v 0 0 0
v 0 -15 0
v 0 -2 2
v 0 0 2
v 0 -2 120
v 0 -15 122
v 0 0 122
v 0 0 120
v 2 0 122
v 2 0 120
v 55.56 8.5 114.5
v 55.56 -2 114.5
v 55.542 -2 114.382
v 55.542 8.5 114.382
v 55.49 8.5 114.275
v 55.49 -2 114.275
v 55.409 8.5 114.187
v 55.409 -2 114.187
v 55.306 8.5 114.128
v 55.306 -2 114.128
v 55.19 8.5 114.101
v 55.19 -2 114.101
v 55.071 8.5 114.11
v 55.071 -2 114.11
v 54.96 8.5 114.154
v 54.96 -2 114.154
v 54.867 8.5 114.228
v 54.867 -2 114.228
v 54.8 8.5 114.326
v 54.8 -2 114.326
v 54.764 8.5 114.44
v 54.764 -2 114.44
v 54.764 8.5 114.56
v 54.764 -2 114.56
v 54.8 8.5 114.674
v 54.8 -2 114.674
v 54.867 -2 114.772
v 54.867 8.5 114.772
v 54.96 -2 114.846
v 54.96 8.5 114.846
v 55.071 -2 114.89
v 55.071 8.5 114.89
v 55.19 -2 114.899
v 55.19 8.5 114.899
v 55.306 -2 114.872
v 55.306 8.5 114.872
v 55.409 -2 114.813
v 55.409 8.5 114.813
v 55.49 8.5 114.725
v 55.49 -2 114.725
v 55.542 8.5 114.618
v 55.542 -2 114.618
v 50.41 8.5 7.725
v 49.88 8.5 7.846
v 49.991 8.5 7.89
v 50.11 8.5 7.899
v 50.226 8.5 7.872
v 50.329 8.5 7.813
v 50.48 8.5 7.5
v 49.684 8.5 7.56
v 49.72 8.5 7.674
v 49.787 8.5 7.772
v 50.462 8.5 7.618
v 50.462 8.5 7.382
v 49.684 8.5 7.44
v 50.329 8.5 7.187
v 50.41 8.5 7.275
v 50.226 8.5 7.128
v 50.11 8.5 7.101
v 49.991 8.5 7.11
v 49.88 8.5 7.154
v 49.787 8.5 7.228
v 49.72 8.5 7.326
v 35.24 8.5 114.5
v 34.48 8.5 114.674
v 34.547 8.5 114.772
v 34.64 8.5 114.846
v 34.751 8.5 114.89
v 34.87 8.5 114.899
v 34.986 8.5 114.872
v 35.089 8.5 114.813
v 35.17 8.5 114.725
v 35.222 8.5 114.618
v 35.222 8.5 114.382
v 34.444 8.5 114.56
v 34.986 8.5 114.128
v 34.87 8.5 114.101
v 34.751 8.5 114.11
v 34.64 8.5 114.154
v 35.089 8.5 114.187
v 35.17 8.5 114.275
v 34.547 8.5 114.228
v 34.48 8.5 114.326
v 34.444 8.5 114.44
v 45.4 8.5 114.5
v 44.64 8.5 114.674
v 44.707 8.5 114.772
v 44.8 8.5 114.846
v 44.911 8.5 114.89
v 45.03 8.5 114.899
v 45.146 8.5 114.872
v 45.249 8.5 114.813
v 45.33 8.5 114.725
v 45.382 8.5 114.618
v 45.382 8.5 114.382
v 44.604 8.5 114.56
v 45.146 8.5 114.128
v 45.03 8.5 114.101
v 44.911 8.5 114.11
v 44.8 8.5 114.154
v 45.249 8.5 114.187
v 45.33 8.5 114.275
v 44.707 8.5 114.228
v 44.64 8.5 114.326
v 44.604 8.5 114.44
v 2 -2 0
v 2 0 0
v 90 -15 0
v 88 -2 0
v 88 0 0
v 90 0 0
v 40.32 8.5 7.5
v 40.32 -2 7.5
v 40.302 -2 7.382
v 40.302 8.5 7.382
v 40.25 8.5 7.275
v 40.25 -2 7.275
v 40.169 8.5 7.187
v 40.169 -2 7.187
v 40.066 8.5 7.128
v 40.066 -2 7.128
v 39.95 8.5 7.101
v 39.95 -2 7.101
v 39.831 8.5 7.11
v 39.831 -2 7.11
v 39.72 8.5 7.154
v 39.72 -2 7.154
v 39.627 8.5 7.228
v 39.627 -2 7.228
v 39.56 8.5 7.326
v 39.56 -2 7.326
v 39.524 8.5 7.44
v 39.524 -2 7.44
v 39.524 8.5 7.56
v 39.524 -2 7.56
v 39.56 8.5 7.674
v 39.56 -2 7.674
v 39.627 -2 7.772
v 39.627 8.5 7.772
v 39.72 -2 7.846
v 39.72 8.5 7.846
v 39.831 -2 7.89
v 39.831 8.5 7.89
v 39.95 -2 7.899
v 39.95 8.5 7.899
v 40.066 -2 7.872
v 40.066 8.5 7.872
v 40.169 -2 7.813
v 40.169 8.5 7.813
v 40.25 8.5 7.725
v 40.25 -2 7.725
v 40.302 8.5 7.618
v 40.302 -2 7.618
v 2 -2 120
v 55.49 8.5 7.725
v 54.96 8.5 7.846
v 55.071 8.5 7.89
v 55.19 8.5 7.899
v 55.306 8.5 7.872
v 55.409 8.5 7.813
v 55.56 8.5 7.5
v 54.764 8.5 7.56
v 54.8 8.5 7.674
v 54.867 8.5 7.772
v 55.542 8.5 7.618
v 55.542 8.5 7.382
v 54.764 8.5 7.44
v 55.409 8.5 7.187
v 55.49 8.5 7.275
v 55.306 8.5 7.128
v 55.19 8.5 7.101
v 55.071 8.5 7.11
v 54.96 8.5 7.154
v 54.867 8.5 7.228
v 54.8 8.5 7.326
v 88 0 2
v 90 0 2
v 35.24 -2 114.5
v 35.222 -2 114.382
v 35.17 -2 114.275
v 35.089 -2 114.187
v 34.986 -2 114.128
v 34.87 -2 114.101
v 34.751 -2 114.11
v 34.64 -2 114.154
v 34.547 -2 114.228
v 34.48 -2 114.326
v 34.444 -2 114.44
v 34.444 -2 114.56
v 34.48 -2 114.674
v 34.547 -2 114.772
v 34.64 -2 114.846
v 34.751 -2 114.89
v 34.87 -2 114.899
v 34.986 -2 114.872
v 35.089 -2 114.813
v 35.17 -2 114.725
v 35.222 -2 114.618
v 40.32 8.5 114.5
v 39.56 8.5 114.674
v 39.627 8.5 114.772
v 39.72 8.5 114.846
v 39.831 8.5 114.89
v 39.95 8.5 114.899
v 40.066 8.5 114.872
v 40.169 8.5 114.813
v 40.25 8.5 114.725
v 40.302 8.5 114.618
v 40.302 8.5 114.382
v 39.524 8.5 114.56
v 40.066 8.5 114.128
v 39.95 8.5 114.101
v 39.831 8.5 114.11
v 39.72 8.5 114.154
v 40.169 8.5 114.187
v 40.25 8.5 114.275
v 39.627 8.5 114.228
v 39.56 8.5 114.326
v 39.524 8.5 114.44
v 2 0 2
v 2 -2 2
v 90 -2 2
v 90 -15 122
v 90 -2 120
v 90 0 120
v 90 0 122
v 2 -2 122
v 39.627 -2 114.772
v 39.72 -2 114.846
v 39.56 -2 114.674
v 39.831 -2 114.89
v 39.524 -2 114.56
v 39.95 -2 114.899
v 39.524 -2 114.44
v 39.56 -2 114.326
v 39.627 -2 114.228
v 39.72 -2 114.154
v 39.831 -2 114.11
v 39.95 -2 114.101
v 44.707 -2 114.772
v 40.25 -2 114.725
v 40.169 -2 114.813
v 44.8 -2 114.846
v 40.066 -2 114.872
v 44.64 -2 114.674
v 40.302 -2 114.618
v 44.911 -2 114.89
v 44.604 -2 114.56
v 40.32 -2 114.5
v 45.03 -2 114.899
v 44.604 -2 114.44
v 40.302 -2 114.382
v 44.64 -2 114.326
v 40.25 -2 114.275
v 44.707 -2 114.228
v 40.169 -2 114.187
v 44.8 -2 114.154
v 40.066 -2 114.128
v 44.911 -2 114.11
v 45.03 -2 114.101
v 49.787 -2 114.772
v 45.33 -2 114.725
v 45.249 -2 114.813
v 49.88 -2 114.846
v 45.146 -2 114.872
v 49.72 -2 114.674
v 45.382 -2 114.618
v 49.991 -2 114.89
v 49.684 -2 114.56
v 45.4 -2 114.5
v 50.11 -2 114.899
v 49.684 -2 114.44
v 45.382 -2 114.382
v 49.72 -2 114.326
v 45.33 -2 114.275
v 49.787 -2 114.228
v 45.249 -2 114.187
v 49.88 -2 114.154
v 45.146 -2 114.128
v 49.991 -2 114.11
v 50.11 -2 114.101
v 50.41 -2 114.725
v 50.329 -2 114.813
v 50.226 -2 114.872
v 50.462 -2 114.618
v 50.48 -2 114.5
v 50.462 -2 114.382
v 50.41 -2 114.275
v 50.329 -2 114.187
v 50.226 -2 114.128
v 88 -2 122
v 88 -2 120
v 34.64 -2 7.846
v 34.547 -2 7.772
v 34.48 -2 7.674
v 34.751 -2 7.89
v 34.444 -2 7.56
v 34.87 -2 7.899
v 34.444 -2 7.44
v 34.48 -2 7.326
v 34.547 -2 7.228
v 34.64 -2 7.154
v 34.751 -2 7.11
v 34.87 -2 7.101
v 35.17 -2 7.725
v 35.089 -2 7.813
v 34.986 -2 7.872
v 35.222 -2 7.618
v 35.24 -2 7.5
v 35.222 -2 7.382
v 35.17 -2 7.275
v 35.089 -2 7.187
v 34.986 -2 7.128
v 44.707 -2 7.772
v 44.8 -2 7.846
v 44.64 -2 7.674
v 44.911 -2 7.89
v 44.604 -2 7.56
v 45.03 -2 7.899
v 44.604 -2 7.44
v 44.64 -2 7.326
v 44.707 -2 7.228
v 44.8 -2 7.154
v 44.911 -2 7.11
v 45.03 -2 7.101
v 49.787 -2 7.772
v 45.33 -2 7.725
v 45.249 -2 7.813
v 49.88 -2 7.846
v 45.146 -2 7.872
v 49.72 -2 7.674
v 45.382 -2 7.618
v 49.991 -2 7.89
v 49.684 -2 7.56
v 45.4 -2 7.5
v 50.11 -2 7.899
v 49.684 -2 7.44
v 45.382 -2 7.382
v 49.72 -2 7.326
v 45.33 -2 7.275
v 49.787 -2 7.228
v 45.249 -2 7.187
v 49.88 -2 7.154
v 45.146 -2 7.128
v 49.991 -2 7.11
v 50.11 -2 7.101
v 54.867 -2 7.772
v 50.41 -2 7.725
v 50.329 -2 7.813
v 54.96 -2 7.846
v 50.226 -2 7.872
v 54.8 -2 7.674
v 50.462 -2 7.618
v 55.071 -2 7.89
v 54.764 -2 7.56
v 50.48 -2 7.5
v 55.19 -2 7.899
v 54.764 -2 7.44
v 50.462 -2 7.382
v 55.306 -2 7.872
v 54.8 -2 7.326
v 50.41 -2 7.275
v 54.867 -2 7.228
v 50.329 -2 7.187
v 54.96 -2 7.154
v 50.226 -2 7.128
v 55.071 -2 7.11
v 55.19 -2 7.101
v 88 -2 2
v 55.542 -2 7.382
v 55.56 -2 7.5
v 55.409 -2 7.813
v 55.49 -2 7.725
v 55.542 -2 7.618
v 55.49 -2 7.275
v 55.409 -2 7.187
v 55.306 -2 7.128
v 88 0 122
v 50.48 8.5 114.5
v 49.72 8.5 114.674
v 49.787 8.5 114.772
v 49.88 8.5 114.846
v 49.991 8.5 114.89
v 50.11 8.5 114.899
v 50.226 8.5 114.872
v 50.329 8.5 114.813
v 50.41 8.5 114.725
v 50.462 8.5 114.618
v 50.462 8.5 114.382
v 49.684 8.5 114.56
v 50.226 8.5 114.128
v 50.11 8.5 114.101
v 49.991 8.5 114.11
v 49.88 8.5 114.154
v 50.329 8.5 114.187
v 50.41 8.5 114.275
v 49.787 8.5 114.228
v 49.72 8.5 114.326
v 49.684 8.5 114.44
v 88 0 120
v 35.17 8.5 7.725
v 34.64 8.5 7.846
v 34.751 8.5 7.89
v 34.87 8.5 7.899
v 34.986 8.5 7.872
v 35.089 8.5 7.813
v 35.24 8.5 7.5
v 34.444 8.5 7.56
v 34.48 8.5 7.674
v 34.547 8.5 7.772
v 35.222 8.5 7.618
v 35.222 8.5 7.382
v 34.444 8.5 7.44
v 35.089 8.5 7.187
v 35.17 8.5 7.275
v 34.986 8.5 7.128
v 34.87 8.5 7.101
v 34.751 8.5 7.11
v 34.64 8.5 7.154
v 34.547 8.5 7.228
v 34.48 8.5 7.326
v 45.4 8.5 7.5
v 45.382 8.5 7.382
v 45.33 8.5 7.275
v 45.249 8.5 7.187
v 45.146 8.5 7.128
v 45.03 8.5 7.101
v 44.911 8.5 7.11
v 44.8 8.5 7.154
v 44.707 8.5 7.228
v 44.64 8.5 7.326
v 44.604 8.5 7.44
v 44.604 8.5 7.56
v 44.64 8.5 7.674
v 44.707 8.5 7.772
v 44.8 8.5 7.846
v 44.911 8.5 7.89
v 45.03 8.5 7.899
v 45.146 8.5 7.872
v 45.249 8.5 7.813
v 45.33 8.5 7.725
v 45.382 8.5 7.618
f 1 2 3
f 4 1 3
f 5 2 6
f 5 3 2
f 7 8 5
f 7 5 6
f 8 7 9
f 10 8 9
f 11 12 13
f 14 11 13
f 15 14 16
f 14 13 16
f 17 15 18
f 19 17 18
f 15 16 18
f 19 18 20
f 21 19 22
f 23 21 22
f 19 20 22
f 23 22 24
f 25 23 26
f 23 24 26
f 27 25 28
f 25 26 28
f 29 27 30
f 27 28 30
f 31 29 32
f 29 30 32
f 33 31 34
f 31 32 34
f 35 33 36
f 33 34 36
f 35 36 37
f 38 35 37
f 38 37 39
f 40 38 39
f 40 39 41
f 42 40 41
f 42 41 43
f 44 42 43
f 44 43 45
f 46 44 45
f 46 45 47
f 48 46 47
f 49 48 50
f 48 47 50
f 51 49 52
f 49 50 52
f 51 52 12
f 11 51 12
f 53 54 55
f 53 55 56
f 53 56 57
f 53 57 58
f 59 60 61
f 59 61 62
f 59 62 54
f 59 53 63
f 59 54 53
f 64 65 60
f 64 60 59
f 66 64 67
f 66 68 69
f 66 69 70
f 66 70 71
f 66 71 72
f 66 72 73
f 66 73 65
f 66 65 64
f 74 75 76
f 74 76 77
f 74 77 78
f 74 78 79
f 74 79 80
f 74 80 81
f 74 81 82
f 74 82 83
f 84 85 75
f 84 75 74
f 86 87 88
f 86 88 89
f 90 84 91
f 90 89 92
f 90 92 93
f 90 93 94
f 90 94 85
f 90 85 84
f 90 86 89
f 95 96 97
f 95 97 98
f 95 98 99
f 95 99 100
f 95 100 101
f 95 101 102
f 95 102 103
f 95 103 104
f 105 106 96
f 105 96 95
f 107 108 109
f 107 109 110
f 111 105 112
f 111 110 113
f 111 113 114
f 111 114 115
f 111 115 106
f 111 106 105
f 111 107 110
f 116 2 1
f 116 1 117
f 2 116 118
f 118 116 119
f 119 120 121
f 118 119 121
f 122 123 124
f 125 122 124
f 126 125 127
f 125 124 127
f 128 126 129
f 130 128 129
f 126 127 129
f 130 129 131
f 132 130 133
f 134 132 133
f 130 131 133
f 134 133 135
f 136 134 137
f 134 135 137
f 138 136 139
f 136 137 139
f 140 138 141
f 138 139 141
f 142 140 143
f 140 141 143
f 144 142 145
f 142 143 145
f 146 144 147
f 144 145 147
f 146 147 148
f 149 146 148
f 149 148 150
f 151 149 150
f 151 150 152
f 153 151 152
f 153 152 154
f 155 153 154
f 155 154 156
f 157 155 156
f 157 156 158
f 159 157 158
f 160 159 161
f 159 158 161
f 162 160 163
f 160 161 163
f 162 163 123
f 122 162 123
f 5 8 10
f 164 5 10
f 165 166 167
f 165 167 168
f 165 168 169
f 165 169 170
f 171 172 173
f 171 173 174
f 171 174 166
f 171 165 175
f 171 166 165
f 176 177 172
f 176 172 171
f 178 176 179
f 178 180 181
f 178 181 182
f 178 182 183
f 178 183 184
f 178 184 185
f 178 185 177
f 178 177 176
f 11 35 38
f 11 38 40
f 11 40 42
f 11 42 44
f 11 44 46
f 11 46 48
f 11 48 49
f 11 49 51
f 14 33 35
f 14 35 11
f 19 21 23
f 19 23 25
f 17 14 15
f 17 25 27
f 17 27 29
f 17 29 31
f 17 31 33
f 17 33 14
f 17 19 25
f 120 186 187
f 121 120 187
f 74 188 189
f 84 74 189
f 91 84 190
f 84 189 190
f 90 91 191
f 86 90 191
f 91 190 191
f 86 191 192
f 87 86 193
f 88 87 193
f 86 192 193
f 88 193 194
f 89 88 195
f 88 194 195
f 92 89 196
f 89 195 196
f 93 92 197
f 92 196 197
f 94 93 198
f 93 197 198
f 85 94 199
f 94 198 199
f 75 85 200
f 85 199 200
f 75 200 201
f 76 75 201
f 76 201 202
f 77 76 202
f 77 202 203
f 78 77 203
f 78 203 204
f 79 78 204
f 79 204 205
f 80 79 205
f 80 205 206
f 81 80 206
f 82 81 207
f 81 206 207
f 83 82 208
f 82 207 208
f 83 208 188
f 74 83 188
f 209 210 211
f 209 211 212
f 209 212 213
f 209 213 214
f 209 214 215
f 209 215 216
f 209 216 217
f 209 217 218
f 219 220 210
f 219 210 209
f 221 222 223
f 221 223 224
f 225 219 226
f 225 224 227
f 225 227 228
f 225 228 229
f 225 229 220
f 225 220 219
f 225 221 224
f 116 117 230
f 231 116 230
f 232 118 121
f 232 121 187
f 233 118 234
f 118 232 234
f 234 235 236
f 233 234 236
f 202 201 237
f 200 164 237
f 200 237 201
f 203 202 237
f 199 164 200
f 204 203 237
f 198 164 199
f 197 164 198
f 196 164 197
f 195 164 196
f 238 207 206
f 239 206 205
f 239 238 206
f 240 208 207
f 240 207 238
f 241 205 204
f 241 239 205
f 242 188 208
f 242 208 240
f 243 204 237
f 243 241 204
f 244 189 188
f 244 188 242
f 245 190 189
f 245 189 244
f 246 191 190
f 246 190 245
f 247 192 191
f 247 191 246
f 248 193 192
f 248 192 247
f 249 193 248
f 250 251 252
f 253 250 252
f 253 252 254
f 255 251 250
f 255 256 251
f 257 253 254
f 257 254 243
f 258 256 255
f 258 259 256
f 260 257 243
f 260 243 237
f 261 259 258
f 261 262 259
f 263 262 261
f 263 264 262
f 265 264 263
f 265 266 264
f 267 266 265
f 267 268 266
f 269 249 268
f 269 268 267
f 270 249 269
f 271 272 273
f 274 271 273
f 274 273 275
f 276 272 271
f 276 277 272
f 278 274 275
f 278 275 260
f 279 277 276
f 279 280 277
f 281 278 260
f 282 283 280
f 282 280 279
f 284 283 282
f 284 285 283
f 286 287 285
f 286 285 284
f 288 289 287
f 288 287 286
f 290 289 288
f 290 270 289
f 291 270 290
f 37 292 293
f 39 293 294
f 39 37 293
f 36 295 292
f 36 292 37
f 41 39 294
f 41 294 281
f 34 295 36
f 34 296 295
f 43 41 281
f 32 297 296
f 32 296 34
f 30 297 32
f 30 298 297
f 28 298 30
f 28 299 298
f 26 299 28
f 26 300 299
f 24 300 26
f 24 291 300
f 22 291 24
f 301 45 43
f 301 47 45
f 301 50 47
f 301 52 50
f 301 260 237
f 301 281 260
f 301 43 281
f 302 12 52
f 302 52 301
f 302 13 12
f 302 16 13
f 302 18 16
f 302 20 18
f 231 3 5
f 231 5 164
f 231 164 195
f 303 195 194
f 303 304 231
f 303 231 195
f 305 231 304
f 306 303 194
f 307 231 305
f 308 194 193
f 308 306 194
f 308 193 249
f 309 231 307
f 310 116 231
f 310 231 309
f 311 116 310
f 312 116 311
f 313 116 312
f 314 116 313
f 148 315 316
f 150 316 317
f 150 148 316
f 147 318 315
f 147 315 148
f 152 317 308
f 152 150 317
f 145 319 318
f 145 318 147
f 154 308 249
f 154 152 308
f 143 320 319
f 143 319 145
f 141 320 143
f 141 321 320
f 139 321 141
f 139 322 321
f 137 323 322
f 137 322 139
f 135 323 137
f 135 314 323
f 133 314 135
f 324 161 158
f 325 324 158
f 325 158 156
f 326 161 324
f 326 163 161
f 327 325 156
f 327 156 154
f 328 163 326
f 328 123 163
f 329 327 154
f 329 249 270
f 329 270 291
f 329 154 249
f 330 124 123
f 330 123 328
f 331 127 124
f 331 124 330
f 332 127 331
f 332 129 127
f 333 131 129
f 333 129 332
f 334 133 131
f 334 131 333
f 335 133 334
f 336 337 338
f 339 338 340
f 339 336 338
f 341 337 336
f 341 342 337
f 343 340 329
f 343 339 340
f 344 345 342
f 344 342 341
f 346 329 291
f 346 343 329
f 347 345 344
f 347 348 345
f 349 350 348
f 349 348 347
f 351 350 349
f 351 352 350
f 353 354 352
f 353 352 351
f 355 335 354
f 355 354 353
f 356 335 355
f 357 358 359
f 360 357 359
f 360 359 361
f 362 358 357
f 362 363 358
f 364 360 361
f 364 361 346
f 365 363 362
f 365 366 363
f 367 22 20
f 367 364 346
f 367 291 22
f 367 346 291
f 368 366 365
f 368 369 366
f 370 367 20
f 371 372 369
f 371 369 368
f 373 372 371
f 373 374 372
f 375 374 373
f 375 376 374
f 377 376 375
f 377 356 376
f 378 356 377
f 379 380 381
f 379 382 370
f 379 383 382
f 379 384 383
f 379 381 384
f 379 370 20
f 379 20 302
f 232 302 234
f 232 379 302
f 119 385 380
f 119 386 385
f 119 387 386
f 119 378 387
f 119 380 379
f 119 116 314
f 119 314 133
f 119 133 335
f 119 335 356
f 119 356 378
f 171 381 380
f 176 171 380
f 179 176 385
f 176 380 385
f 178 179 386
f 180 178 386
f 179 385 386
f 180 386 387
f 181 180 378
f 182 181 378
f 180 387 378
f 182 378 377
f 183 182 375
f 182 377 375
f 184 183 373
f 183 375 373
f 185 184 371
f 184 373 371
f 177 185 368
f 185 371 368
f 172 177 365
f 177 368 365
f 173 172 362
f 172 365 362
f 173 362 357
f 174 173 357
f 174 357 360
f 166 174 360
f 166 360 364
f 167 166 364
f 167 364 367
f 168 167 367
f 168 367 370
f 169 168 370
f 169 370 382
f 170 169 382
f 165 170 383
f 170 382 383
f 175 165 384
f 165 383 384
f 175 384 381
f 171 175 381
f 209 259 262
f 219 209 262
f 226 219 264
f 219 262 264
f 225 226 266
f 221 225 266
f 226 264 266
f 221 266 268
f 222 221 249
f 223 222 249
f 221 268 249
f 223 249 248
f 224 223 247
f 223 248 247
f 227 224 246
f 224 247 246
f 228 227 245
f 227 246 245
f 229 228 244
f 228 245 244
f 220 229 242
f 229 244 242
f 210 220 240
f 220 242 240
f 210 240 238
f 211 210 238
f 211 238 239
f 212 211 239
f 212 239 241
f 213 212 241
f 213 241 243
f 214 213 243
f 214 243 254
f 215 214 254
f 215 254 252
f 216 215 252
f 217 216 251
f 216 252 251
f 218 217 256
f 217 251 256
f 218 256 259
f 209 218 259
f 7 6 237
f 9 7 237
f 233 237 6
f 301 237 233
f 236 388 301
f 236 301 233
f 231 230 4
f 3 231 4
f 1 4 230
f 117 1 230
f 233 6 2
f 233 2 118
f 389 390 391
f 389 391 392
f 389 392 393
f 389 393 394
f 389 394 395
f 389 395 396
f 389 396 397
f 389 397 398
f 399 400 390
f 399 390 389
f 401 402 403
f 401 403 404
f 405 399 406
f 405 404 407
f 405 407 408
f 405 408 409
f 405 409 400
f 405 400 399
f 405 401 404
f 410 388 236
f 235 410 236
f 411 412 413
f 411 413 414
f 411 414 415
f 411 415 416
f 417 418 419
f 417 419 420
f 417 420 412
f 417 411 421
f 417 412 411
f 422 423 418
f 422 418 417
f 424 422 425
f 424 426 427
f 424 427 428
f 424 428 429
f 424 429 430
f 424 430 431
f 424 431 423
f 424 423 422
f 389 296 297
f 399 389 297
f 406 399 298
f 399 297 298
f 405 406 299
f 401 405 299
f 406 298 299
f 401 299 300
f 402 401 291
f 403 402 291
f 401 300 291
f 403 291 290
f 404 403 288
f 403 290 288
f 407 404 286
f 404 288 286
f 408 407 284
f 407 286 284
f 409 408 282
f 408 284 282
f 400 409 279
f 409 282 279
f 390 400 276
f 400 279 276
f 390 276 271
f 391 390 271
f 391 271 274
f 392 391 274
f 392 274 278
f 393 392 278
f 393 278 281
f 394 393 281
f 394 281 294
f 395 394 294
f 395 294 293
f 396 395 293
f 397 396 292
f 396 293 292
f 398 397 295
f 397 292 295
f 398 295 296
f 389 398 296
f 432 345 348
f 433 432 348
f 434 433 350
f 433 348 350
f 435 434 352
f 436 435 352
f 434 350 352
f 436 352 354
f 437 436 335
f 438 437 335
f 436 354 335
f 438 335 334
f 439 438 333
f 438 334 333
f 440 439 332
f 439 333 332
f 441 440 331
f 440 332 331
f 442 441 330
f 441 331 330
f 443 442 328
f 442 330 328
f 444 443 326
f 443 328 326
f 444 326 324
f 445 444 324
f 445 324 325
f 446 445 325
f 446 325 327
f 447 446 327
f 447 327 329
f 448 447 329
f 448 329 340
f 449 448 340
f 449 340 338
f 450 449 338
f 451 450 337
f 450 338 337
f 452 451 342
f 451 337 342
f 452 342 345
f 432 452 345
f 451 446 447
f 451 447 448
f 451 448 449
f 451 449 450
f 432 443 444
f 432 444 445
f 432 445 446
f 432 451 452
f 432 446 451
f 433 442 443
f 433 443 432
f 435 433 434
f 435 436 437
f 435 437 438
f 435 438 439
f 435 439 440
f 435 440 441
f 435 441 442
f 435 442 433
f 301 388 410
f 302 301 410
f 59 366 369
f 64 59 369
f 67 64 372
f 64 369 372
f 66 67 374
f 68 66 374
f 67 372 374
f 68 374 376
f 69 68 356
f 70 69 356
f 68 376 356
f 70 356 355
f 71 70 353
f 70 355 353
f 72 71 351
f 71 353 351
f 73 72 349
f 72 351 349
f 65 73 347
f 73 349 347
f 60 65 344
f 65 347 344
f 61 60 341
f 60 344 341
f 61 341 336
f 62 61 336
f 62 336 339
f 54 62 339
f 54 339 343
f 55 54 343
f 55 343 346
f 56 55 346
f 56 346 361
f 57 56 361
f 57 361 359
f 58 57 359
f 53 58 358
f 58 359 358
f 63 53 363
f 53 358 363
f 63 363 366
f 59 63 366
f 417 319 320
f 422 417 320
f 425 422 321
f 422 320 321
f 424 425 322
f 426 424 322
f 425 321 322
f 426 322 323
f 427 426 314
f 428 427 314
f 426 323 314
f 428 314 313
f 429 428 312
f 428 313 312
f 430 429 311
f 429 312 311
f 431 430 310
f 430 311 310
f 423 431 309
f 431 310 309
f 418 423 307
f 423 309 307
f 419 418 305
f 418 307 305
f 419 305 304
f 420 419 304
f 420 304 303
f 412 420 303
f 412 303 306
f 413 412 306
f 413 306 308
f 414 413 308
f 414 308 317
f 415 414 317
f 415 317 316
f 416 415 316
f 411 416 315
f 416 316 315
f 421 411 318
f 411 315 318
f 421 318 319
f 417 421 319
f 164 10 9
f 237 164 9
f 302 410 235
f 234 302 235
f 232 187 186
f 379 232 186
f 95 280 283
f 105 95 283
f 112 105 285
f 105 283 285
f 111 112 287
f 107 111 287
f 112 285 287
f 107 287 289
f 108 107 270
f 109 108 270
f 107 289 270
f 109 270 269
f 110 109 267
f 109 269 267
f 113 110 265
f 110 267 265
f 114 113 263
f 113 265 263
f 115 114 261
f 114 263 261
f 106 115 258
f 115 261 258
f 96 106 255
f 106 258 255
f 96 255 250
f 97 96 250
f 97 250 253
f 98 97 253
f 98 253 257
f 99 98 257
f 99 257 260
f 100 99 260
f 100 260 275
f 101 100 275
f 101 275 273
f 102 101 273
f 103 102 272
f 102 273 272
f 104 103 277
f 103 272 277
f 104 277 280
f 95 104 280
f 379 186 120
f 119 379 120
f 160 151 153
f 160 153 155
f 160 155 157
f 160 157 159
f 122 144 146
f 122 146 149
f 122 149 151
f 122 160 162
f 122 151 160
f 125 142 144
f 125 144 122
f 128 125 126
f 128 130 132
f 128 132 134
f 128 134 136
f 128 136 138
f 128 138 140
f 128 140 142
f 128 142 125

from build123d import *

# Parameters (mm, degrees)
SKETCH_W     = 90
SKETCH_H     = 122
PAD_DEPTH    = 15
POCKET_DEPTH = 2
SKETCH002_R  = 0.4
PAD001_DEPTH = 10.5


with BuildPart() as part:
    # Sketch → Pad (new body)
    with BuildSketch(Plane.XZ):
        with Locations((45, 61)):
            Rectangle(SKETCH_W, SKETCH_H)
    extrude(amount=PAD_DEPTH)

    # Sketch001 (on Face5 of Pad) → Pocket (cut)
    with BuildSketch(Plane(origin=(0, 0, 0), x_dir=(1, 0, 0), z_dir=(0, 1, 0))):
        Polygon((88, -122), (88, -120), (90, -120), (90, -2), (88, -2), (88, 0), (2, 0), (2, -2), (0, -2), (0, -120), (2, -120), (2, -122), align=None)
    extrude(amount=-POCKET_DEPTH, mode=Mode.SUBTRACT)

    # Sketch002 (on Face4 of Pocket) → Pad001 (join)
    with BuildSketch(Plane(origin=(0, -2, 0), x_dir=(1, 0, 0), z_dir=(0, 1, 0))):
        with Locations((34.84, -7.5)):
            Circle(SKETCH002_R)
        with Locations((39.92, -7.5)):
            Circle(SKETCH002_R)
        with Locations((45, -7.5)):
            Circle(SKETCH002_R)
        with Locations((50.08, -7.5)):
            Circle(SKETCH002_R)
        with Locations((55.16, -7.5)):
            Circle(SKETCH002_R)
        with Locations((34.84, -114.5)):
            Circle(SKETCH002_R)
        with Locations((39.92, -114.5)):
            Circle(SKETCH002_R)
        with Locations((45, -114.5)):
            Circle(SKETCH002_R)
        with Locations((50.08, -114.5)):
            Circle(SKETCH002_R)
        with Locations((55.16, -114.5)):
            Circle(SKETCH002_R)
    extrude(amount=PAD001_DEPTH)


solid = part.part
